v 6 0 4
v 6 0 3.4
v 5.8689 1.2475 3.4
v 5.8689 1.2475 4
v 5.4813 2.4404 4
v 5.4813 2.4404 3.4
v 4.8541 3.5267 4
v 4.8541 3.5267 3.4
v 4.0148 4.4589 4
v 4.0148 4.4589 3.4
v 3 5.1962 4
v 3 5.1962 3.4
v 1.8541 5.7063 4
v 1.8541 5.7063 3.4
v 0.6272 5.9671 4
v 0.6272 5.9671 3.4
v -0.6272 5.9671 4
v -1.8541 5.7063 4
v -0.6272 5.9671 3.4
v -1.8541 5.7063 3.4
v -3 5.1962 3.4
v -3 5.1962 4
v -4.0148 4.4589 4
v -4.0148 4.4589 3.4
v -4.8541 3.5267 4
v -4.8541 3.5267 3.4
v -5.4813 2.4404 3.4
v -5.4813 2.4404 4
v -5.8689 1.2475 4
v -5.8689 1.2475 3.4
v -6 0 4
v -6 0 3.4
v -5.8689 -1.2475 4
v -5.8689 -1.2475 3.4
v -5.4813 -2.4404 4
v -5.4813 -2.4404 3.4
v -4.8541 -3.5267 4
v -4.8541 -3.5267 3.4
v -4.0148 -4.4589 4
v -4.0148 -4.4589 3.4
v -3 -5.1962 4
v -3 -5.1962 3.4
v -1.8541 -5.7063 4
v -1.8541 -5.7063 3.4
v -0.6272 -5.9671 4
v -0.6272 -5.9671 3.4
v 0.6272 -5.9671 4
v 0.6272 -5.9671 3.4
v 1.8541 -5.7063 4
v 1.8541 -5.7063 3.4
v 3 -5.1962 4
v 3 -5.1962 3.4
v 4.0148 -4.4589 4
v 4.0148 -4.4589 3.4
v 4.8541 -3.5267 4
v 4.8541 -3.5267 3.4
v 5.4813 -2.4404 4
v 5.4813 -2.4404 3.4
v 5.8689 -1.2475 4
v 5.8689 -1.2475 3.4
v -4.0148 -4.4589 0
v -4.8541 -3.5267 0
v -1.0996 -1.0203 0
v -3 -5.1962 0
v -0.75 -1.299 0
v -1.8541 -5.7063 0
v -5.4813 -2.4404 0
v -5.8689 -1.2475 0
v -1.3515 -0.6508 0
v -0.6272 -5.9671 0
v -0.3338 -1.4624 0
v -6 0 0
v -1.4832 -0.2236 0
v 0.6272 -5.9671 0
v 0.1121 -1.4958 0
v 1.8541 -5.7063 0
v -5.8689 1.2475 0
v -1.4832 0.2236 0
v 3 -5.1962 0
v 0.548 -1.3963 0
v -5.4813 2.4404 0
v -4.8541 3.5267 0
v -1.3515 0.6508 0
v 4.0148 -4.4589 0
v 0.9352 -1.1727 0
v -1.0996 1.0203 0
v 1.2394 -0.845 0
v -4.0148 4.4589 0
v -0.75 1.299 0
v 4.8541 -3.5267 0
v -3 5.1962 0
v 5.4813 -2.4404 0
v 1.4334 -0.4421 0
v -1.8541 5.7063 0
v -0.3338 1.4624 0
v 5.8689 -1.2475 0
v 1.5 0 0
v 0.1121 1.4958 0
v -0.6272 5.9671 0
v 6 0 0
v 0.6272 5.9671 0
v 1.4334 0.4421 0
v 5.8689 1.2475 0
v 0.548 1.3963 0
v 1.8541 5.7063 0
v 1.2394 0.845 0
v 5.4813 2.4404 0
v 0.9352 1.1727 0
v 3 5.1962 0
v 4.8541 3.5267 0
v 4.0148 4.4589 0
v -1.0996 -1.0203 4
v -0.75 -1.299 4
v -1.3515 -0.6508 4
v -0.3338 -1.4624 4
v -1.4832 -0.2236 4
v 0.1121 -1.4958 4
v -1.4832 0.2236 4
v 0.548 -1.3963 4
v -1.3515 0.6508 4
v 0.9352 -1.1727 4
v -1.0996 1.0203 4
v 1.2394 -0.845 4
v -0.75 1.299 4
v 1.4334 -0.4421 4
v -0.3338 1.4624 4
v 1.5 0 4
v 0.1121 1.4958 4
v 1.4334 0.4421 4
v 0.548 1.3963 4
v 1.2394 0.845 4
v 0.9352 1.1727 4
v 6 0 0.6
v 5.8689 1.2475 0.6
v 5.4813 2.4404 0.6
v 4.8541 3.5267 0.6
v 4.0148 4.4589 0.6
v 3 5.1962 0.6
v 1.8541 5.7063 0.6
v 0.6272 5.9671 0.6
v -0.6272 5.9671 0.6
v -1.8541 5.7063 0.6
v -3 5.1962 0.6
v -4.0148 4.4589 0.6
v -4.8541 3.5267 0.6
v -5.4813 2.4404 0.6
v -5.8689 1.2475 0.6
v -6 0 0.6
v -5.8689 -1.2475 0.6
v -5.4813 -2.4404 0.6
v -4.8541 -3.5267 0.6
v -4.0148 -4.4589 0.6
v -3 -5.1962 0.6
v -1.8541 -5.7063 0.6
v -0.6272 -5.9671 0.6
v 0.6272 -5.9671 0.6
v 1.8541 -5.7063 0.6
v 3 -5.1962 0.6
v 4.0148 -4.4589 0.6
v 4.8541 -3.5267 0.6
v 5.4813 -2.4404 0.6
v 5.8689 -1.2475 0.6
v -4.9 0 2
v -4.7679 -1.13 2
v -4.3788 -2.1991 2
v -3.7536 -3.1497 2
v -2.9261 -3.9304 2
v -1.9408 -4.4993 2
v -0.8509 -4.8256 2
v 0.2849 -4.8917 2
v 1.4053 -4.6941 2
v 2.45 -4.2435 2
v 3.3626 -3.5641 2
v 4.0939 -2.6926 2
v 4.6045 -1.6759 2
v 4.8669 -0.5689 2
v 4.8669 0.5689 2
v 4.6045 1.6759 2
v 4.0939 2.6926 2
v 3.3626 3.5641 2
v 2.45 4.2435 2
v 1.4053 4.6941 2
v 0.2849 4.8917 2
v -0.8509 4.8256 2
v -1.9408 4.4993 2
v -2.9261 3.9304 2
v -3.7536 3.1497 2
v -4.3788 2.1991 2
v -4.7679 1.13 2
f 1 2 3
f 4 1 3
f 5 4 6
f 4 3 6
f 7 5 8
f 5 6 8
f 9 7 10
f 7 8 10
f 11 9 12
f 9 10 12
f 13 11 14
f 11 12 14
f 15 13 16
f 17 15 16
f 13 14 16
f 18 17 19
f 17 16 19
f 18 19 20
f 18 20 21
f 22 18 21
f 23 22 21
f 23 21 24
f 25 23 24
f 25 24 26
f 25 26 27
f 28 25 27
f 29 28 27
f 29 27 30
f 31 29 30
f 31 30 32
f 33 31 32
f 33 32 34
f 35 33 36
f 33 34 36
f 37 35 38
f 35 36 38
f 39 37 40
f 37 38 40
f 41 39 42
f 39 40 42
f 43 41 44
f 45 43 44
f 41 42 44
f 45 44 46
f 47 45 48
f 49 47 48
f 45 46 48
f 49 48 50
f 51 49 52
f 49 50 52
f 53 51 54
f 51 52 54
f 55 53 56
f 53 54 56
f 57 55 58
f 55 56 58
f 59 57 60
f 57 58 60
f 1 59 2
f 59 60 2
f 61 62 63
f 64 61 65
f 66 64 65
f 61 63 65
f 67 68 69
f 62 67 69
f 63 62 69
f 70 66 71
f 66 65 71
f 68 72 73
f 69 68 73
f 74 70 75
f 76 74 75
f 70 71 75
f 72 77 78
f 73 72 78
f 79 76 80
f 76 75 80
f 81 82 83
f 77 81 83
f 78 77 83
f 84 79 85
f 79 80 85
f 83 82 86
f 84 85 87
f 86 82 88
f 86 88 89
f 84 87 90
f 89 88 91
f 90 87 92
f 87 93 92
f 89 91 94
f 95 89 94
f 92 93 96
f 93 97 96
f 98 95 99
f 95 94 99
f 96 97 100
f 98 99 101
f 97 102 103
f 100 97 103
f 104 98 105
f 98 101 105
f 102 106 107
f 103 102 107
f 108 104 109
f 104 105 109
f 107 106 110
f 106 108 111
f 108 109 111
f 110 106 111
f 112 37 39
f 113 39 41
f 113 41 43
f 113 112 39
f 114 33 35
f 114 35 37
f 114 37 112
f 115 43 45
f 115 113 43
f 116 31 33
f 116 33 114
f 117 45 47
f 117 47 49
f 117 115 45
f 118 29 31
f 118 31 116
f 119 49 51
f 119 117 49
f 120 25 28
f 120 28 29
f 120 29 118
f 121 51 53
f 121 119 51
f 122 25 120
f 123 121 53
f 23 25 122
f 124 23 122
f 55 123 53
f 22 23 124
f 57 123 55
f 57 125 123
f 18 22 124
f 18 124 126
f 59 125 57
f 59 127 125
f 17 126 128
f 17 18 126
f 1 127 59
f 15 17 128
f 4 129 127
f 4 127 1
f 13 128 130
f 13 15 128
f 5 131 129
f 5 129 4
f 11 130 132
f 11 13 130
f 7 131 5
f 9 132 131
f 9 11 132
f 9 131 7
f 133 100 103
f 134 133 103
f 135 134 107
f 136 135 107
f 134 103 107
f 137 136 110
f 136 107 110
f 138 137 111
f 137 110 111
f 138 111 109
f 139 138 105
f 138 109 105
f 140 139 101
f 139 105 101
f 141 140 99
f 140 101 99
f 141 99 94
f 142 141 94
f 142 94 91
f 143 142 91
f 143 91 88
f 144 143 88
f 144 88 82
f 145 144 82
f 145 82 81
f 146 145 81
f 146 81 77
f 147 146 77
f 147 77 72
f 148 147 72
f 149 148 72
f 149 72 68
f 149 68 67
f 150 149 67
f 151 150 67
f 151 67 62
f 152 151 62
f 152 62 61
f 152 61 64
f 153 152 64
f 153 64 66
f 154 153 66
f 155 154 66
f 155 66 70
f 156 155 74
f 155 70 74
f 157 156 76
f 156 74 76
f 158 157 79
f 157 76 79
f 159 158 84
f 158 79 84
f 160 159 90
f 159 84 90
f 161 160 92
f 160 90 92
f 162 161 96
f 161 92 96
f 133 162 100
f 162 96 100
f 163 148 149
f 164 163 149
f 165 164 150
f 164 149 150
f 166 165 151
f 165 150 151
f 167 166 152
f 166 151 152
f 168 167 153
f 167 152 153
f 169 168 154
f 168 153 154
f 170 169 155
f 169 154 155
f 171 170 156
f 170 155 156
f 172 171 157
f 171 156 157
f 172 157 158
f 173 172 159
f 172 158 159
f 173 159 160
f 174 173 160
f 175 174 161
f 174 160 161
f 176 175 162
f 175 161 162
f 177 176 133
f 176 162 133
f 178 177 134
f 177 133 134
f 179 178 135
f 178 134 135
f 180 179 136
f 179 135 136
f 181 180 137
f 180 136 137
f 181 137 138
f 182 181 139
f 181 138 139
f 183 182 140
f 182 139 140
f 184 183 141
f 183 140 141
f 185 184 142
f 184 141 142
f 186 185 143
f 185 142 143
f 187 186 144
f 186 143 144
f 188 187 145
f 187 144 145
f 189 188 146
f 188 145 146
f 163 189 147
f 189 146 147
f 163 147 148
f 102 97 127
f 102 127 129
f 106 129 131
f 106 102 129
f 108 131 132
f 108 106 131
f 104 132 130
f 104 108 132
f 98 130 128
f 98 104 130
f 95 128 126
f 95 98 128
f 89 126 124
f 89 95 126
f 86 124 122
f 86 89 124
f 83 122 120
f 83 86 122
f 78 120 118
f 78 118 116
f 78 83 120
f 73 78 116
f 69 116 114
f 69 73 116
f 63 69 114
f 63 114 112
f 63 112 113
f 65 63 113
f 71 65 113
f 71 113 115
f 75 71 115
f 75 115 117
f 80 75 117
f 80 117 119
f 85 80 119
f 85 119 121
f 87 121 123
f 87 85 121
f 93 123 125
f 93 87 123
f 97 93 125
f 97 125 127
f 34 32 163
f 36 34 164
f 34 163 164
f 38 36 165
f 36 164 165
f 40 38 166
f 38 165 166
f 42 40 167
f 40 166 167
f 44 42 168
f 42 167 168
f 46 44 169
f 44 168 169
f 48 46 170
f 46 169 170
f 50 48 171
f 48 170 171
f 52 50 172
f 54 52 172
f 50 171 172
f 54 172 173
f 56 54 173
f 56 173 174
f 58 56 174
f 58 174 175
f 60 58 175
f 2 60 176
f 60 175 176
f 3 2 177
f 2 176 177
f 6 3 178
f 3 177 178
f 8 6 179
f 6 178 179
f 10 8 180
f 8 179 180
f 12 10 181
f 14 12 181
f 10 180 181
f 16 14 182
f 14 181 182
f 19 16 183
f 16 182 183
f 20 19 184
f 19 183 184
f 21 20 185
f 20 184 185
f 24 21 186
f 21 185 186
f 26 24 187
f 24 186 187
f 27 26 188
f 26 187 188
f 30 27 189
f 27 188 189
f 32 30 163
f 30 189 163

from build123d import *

# Parameters (mm, degrees)
SKETCH_1_R      = 6
SKETCH_1_R_2    = 1.5
EXTRUDE_1_DEPTH = 4


with BuildPart() as part:
    # 草图1 → 凸台-拉伸1 (new body)
    with BuildSketch(Plane.XY):
        Circle(SKETCH_1_R)
        Circle(SKETCH_1_R_2, mode=Mode.SUBTRACT)
    extrude(amount=EXTRUDE_1_DEPTH)

    # 草图2 → 切除-旋转1 (revolve, cut)
    with BuildSketch(Plane(origin=(0, 0, 0), x_dir=(0, 0, -1), z_dir=(1, 0, 0)), mode=Mode.PRIVATE) as cut_revolve_1_sk:
        Polygon((-3.4, 6), (-2, 4.9), (-0.6, 6), align=None)
    revolve(cut_revolve_1_sk.sketch.rotate(Axis((0, 0, 0), (0, 0, 1)), 90), axis=Axis((0, 0, 0), (0, 0, 1)), mode=Mode.SUBTRACT)


solid = part.part
